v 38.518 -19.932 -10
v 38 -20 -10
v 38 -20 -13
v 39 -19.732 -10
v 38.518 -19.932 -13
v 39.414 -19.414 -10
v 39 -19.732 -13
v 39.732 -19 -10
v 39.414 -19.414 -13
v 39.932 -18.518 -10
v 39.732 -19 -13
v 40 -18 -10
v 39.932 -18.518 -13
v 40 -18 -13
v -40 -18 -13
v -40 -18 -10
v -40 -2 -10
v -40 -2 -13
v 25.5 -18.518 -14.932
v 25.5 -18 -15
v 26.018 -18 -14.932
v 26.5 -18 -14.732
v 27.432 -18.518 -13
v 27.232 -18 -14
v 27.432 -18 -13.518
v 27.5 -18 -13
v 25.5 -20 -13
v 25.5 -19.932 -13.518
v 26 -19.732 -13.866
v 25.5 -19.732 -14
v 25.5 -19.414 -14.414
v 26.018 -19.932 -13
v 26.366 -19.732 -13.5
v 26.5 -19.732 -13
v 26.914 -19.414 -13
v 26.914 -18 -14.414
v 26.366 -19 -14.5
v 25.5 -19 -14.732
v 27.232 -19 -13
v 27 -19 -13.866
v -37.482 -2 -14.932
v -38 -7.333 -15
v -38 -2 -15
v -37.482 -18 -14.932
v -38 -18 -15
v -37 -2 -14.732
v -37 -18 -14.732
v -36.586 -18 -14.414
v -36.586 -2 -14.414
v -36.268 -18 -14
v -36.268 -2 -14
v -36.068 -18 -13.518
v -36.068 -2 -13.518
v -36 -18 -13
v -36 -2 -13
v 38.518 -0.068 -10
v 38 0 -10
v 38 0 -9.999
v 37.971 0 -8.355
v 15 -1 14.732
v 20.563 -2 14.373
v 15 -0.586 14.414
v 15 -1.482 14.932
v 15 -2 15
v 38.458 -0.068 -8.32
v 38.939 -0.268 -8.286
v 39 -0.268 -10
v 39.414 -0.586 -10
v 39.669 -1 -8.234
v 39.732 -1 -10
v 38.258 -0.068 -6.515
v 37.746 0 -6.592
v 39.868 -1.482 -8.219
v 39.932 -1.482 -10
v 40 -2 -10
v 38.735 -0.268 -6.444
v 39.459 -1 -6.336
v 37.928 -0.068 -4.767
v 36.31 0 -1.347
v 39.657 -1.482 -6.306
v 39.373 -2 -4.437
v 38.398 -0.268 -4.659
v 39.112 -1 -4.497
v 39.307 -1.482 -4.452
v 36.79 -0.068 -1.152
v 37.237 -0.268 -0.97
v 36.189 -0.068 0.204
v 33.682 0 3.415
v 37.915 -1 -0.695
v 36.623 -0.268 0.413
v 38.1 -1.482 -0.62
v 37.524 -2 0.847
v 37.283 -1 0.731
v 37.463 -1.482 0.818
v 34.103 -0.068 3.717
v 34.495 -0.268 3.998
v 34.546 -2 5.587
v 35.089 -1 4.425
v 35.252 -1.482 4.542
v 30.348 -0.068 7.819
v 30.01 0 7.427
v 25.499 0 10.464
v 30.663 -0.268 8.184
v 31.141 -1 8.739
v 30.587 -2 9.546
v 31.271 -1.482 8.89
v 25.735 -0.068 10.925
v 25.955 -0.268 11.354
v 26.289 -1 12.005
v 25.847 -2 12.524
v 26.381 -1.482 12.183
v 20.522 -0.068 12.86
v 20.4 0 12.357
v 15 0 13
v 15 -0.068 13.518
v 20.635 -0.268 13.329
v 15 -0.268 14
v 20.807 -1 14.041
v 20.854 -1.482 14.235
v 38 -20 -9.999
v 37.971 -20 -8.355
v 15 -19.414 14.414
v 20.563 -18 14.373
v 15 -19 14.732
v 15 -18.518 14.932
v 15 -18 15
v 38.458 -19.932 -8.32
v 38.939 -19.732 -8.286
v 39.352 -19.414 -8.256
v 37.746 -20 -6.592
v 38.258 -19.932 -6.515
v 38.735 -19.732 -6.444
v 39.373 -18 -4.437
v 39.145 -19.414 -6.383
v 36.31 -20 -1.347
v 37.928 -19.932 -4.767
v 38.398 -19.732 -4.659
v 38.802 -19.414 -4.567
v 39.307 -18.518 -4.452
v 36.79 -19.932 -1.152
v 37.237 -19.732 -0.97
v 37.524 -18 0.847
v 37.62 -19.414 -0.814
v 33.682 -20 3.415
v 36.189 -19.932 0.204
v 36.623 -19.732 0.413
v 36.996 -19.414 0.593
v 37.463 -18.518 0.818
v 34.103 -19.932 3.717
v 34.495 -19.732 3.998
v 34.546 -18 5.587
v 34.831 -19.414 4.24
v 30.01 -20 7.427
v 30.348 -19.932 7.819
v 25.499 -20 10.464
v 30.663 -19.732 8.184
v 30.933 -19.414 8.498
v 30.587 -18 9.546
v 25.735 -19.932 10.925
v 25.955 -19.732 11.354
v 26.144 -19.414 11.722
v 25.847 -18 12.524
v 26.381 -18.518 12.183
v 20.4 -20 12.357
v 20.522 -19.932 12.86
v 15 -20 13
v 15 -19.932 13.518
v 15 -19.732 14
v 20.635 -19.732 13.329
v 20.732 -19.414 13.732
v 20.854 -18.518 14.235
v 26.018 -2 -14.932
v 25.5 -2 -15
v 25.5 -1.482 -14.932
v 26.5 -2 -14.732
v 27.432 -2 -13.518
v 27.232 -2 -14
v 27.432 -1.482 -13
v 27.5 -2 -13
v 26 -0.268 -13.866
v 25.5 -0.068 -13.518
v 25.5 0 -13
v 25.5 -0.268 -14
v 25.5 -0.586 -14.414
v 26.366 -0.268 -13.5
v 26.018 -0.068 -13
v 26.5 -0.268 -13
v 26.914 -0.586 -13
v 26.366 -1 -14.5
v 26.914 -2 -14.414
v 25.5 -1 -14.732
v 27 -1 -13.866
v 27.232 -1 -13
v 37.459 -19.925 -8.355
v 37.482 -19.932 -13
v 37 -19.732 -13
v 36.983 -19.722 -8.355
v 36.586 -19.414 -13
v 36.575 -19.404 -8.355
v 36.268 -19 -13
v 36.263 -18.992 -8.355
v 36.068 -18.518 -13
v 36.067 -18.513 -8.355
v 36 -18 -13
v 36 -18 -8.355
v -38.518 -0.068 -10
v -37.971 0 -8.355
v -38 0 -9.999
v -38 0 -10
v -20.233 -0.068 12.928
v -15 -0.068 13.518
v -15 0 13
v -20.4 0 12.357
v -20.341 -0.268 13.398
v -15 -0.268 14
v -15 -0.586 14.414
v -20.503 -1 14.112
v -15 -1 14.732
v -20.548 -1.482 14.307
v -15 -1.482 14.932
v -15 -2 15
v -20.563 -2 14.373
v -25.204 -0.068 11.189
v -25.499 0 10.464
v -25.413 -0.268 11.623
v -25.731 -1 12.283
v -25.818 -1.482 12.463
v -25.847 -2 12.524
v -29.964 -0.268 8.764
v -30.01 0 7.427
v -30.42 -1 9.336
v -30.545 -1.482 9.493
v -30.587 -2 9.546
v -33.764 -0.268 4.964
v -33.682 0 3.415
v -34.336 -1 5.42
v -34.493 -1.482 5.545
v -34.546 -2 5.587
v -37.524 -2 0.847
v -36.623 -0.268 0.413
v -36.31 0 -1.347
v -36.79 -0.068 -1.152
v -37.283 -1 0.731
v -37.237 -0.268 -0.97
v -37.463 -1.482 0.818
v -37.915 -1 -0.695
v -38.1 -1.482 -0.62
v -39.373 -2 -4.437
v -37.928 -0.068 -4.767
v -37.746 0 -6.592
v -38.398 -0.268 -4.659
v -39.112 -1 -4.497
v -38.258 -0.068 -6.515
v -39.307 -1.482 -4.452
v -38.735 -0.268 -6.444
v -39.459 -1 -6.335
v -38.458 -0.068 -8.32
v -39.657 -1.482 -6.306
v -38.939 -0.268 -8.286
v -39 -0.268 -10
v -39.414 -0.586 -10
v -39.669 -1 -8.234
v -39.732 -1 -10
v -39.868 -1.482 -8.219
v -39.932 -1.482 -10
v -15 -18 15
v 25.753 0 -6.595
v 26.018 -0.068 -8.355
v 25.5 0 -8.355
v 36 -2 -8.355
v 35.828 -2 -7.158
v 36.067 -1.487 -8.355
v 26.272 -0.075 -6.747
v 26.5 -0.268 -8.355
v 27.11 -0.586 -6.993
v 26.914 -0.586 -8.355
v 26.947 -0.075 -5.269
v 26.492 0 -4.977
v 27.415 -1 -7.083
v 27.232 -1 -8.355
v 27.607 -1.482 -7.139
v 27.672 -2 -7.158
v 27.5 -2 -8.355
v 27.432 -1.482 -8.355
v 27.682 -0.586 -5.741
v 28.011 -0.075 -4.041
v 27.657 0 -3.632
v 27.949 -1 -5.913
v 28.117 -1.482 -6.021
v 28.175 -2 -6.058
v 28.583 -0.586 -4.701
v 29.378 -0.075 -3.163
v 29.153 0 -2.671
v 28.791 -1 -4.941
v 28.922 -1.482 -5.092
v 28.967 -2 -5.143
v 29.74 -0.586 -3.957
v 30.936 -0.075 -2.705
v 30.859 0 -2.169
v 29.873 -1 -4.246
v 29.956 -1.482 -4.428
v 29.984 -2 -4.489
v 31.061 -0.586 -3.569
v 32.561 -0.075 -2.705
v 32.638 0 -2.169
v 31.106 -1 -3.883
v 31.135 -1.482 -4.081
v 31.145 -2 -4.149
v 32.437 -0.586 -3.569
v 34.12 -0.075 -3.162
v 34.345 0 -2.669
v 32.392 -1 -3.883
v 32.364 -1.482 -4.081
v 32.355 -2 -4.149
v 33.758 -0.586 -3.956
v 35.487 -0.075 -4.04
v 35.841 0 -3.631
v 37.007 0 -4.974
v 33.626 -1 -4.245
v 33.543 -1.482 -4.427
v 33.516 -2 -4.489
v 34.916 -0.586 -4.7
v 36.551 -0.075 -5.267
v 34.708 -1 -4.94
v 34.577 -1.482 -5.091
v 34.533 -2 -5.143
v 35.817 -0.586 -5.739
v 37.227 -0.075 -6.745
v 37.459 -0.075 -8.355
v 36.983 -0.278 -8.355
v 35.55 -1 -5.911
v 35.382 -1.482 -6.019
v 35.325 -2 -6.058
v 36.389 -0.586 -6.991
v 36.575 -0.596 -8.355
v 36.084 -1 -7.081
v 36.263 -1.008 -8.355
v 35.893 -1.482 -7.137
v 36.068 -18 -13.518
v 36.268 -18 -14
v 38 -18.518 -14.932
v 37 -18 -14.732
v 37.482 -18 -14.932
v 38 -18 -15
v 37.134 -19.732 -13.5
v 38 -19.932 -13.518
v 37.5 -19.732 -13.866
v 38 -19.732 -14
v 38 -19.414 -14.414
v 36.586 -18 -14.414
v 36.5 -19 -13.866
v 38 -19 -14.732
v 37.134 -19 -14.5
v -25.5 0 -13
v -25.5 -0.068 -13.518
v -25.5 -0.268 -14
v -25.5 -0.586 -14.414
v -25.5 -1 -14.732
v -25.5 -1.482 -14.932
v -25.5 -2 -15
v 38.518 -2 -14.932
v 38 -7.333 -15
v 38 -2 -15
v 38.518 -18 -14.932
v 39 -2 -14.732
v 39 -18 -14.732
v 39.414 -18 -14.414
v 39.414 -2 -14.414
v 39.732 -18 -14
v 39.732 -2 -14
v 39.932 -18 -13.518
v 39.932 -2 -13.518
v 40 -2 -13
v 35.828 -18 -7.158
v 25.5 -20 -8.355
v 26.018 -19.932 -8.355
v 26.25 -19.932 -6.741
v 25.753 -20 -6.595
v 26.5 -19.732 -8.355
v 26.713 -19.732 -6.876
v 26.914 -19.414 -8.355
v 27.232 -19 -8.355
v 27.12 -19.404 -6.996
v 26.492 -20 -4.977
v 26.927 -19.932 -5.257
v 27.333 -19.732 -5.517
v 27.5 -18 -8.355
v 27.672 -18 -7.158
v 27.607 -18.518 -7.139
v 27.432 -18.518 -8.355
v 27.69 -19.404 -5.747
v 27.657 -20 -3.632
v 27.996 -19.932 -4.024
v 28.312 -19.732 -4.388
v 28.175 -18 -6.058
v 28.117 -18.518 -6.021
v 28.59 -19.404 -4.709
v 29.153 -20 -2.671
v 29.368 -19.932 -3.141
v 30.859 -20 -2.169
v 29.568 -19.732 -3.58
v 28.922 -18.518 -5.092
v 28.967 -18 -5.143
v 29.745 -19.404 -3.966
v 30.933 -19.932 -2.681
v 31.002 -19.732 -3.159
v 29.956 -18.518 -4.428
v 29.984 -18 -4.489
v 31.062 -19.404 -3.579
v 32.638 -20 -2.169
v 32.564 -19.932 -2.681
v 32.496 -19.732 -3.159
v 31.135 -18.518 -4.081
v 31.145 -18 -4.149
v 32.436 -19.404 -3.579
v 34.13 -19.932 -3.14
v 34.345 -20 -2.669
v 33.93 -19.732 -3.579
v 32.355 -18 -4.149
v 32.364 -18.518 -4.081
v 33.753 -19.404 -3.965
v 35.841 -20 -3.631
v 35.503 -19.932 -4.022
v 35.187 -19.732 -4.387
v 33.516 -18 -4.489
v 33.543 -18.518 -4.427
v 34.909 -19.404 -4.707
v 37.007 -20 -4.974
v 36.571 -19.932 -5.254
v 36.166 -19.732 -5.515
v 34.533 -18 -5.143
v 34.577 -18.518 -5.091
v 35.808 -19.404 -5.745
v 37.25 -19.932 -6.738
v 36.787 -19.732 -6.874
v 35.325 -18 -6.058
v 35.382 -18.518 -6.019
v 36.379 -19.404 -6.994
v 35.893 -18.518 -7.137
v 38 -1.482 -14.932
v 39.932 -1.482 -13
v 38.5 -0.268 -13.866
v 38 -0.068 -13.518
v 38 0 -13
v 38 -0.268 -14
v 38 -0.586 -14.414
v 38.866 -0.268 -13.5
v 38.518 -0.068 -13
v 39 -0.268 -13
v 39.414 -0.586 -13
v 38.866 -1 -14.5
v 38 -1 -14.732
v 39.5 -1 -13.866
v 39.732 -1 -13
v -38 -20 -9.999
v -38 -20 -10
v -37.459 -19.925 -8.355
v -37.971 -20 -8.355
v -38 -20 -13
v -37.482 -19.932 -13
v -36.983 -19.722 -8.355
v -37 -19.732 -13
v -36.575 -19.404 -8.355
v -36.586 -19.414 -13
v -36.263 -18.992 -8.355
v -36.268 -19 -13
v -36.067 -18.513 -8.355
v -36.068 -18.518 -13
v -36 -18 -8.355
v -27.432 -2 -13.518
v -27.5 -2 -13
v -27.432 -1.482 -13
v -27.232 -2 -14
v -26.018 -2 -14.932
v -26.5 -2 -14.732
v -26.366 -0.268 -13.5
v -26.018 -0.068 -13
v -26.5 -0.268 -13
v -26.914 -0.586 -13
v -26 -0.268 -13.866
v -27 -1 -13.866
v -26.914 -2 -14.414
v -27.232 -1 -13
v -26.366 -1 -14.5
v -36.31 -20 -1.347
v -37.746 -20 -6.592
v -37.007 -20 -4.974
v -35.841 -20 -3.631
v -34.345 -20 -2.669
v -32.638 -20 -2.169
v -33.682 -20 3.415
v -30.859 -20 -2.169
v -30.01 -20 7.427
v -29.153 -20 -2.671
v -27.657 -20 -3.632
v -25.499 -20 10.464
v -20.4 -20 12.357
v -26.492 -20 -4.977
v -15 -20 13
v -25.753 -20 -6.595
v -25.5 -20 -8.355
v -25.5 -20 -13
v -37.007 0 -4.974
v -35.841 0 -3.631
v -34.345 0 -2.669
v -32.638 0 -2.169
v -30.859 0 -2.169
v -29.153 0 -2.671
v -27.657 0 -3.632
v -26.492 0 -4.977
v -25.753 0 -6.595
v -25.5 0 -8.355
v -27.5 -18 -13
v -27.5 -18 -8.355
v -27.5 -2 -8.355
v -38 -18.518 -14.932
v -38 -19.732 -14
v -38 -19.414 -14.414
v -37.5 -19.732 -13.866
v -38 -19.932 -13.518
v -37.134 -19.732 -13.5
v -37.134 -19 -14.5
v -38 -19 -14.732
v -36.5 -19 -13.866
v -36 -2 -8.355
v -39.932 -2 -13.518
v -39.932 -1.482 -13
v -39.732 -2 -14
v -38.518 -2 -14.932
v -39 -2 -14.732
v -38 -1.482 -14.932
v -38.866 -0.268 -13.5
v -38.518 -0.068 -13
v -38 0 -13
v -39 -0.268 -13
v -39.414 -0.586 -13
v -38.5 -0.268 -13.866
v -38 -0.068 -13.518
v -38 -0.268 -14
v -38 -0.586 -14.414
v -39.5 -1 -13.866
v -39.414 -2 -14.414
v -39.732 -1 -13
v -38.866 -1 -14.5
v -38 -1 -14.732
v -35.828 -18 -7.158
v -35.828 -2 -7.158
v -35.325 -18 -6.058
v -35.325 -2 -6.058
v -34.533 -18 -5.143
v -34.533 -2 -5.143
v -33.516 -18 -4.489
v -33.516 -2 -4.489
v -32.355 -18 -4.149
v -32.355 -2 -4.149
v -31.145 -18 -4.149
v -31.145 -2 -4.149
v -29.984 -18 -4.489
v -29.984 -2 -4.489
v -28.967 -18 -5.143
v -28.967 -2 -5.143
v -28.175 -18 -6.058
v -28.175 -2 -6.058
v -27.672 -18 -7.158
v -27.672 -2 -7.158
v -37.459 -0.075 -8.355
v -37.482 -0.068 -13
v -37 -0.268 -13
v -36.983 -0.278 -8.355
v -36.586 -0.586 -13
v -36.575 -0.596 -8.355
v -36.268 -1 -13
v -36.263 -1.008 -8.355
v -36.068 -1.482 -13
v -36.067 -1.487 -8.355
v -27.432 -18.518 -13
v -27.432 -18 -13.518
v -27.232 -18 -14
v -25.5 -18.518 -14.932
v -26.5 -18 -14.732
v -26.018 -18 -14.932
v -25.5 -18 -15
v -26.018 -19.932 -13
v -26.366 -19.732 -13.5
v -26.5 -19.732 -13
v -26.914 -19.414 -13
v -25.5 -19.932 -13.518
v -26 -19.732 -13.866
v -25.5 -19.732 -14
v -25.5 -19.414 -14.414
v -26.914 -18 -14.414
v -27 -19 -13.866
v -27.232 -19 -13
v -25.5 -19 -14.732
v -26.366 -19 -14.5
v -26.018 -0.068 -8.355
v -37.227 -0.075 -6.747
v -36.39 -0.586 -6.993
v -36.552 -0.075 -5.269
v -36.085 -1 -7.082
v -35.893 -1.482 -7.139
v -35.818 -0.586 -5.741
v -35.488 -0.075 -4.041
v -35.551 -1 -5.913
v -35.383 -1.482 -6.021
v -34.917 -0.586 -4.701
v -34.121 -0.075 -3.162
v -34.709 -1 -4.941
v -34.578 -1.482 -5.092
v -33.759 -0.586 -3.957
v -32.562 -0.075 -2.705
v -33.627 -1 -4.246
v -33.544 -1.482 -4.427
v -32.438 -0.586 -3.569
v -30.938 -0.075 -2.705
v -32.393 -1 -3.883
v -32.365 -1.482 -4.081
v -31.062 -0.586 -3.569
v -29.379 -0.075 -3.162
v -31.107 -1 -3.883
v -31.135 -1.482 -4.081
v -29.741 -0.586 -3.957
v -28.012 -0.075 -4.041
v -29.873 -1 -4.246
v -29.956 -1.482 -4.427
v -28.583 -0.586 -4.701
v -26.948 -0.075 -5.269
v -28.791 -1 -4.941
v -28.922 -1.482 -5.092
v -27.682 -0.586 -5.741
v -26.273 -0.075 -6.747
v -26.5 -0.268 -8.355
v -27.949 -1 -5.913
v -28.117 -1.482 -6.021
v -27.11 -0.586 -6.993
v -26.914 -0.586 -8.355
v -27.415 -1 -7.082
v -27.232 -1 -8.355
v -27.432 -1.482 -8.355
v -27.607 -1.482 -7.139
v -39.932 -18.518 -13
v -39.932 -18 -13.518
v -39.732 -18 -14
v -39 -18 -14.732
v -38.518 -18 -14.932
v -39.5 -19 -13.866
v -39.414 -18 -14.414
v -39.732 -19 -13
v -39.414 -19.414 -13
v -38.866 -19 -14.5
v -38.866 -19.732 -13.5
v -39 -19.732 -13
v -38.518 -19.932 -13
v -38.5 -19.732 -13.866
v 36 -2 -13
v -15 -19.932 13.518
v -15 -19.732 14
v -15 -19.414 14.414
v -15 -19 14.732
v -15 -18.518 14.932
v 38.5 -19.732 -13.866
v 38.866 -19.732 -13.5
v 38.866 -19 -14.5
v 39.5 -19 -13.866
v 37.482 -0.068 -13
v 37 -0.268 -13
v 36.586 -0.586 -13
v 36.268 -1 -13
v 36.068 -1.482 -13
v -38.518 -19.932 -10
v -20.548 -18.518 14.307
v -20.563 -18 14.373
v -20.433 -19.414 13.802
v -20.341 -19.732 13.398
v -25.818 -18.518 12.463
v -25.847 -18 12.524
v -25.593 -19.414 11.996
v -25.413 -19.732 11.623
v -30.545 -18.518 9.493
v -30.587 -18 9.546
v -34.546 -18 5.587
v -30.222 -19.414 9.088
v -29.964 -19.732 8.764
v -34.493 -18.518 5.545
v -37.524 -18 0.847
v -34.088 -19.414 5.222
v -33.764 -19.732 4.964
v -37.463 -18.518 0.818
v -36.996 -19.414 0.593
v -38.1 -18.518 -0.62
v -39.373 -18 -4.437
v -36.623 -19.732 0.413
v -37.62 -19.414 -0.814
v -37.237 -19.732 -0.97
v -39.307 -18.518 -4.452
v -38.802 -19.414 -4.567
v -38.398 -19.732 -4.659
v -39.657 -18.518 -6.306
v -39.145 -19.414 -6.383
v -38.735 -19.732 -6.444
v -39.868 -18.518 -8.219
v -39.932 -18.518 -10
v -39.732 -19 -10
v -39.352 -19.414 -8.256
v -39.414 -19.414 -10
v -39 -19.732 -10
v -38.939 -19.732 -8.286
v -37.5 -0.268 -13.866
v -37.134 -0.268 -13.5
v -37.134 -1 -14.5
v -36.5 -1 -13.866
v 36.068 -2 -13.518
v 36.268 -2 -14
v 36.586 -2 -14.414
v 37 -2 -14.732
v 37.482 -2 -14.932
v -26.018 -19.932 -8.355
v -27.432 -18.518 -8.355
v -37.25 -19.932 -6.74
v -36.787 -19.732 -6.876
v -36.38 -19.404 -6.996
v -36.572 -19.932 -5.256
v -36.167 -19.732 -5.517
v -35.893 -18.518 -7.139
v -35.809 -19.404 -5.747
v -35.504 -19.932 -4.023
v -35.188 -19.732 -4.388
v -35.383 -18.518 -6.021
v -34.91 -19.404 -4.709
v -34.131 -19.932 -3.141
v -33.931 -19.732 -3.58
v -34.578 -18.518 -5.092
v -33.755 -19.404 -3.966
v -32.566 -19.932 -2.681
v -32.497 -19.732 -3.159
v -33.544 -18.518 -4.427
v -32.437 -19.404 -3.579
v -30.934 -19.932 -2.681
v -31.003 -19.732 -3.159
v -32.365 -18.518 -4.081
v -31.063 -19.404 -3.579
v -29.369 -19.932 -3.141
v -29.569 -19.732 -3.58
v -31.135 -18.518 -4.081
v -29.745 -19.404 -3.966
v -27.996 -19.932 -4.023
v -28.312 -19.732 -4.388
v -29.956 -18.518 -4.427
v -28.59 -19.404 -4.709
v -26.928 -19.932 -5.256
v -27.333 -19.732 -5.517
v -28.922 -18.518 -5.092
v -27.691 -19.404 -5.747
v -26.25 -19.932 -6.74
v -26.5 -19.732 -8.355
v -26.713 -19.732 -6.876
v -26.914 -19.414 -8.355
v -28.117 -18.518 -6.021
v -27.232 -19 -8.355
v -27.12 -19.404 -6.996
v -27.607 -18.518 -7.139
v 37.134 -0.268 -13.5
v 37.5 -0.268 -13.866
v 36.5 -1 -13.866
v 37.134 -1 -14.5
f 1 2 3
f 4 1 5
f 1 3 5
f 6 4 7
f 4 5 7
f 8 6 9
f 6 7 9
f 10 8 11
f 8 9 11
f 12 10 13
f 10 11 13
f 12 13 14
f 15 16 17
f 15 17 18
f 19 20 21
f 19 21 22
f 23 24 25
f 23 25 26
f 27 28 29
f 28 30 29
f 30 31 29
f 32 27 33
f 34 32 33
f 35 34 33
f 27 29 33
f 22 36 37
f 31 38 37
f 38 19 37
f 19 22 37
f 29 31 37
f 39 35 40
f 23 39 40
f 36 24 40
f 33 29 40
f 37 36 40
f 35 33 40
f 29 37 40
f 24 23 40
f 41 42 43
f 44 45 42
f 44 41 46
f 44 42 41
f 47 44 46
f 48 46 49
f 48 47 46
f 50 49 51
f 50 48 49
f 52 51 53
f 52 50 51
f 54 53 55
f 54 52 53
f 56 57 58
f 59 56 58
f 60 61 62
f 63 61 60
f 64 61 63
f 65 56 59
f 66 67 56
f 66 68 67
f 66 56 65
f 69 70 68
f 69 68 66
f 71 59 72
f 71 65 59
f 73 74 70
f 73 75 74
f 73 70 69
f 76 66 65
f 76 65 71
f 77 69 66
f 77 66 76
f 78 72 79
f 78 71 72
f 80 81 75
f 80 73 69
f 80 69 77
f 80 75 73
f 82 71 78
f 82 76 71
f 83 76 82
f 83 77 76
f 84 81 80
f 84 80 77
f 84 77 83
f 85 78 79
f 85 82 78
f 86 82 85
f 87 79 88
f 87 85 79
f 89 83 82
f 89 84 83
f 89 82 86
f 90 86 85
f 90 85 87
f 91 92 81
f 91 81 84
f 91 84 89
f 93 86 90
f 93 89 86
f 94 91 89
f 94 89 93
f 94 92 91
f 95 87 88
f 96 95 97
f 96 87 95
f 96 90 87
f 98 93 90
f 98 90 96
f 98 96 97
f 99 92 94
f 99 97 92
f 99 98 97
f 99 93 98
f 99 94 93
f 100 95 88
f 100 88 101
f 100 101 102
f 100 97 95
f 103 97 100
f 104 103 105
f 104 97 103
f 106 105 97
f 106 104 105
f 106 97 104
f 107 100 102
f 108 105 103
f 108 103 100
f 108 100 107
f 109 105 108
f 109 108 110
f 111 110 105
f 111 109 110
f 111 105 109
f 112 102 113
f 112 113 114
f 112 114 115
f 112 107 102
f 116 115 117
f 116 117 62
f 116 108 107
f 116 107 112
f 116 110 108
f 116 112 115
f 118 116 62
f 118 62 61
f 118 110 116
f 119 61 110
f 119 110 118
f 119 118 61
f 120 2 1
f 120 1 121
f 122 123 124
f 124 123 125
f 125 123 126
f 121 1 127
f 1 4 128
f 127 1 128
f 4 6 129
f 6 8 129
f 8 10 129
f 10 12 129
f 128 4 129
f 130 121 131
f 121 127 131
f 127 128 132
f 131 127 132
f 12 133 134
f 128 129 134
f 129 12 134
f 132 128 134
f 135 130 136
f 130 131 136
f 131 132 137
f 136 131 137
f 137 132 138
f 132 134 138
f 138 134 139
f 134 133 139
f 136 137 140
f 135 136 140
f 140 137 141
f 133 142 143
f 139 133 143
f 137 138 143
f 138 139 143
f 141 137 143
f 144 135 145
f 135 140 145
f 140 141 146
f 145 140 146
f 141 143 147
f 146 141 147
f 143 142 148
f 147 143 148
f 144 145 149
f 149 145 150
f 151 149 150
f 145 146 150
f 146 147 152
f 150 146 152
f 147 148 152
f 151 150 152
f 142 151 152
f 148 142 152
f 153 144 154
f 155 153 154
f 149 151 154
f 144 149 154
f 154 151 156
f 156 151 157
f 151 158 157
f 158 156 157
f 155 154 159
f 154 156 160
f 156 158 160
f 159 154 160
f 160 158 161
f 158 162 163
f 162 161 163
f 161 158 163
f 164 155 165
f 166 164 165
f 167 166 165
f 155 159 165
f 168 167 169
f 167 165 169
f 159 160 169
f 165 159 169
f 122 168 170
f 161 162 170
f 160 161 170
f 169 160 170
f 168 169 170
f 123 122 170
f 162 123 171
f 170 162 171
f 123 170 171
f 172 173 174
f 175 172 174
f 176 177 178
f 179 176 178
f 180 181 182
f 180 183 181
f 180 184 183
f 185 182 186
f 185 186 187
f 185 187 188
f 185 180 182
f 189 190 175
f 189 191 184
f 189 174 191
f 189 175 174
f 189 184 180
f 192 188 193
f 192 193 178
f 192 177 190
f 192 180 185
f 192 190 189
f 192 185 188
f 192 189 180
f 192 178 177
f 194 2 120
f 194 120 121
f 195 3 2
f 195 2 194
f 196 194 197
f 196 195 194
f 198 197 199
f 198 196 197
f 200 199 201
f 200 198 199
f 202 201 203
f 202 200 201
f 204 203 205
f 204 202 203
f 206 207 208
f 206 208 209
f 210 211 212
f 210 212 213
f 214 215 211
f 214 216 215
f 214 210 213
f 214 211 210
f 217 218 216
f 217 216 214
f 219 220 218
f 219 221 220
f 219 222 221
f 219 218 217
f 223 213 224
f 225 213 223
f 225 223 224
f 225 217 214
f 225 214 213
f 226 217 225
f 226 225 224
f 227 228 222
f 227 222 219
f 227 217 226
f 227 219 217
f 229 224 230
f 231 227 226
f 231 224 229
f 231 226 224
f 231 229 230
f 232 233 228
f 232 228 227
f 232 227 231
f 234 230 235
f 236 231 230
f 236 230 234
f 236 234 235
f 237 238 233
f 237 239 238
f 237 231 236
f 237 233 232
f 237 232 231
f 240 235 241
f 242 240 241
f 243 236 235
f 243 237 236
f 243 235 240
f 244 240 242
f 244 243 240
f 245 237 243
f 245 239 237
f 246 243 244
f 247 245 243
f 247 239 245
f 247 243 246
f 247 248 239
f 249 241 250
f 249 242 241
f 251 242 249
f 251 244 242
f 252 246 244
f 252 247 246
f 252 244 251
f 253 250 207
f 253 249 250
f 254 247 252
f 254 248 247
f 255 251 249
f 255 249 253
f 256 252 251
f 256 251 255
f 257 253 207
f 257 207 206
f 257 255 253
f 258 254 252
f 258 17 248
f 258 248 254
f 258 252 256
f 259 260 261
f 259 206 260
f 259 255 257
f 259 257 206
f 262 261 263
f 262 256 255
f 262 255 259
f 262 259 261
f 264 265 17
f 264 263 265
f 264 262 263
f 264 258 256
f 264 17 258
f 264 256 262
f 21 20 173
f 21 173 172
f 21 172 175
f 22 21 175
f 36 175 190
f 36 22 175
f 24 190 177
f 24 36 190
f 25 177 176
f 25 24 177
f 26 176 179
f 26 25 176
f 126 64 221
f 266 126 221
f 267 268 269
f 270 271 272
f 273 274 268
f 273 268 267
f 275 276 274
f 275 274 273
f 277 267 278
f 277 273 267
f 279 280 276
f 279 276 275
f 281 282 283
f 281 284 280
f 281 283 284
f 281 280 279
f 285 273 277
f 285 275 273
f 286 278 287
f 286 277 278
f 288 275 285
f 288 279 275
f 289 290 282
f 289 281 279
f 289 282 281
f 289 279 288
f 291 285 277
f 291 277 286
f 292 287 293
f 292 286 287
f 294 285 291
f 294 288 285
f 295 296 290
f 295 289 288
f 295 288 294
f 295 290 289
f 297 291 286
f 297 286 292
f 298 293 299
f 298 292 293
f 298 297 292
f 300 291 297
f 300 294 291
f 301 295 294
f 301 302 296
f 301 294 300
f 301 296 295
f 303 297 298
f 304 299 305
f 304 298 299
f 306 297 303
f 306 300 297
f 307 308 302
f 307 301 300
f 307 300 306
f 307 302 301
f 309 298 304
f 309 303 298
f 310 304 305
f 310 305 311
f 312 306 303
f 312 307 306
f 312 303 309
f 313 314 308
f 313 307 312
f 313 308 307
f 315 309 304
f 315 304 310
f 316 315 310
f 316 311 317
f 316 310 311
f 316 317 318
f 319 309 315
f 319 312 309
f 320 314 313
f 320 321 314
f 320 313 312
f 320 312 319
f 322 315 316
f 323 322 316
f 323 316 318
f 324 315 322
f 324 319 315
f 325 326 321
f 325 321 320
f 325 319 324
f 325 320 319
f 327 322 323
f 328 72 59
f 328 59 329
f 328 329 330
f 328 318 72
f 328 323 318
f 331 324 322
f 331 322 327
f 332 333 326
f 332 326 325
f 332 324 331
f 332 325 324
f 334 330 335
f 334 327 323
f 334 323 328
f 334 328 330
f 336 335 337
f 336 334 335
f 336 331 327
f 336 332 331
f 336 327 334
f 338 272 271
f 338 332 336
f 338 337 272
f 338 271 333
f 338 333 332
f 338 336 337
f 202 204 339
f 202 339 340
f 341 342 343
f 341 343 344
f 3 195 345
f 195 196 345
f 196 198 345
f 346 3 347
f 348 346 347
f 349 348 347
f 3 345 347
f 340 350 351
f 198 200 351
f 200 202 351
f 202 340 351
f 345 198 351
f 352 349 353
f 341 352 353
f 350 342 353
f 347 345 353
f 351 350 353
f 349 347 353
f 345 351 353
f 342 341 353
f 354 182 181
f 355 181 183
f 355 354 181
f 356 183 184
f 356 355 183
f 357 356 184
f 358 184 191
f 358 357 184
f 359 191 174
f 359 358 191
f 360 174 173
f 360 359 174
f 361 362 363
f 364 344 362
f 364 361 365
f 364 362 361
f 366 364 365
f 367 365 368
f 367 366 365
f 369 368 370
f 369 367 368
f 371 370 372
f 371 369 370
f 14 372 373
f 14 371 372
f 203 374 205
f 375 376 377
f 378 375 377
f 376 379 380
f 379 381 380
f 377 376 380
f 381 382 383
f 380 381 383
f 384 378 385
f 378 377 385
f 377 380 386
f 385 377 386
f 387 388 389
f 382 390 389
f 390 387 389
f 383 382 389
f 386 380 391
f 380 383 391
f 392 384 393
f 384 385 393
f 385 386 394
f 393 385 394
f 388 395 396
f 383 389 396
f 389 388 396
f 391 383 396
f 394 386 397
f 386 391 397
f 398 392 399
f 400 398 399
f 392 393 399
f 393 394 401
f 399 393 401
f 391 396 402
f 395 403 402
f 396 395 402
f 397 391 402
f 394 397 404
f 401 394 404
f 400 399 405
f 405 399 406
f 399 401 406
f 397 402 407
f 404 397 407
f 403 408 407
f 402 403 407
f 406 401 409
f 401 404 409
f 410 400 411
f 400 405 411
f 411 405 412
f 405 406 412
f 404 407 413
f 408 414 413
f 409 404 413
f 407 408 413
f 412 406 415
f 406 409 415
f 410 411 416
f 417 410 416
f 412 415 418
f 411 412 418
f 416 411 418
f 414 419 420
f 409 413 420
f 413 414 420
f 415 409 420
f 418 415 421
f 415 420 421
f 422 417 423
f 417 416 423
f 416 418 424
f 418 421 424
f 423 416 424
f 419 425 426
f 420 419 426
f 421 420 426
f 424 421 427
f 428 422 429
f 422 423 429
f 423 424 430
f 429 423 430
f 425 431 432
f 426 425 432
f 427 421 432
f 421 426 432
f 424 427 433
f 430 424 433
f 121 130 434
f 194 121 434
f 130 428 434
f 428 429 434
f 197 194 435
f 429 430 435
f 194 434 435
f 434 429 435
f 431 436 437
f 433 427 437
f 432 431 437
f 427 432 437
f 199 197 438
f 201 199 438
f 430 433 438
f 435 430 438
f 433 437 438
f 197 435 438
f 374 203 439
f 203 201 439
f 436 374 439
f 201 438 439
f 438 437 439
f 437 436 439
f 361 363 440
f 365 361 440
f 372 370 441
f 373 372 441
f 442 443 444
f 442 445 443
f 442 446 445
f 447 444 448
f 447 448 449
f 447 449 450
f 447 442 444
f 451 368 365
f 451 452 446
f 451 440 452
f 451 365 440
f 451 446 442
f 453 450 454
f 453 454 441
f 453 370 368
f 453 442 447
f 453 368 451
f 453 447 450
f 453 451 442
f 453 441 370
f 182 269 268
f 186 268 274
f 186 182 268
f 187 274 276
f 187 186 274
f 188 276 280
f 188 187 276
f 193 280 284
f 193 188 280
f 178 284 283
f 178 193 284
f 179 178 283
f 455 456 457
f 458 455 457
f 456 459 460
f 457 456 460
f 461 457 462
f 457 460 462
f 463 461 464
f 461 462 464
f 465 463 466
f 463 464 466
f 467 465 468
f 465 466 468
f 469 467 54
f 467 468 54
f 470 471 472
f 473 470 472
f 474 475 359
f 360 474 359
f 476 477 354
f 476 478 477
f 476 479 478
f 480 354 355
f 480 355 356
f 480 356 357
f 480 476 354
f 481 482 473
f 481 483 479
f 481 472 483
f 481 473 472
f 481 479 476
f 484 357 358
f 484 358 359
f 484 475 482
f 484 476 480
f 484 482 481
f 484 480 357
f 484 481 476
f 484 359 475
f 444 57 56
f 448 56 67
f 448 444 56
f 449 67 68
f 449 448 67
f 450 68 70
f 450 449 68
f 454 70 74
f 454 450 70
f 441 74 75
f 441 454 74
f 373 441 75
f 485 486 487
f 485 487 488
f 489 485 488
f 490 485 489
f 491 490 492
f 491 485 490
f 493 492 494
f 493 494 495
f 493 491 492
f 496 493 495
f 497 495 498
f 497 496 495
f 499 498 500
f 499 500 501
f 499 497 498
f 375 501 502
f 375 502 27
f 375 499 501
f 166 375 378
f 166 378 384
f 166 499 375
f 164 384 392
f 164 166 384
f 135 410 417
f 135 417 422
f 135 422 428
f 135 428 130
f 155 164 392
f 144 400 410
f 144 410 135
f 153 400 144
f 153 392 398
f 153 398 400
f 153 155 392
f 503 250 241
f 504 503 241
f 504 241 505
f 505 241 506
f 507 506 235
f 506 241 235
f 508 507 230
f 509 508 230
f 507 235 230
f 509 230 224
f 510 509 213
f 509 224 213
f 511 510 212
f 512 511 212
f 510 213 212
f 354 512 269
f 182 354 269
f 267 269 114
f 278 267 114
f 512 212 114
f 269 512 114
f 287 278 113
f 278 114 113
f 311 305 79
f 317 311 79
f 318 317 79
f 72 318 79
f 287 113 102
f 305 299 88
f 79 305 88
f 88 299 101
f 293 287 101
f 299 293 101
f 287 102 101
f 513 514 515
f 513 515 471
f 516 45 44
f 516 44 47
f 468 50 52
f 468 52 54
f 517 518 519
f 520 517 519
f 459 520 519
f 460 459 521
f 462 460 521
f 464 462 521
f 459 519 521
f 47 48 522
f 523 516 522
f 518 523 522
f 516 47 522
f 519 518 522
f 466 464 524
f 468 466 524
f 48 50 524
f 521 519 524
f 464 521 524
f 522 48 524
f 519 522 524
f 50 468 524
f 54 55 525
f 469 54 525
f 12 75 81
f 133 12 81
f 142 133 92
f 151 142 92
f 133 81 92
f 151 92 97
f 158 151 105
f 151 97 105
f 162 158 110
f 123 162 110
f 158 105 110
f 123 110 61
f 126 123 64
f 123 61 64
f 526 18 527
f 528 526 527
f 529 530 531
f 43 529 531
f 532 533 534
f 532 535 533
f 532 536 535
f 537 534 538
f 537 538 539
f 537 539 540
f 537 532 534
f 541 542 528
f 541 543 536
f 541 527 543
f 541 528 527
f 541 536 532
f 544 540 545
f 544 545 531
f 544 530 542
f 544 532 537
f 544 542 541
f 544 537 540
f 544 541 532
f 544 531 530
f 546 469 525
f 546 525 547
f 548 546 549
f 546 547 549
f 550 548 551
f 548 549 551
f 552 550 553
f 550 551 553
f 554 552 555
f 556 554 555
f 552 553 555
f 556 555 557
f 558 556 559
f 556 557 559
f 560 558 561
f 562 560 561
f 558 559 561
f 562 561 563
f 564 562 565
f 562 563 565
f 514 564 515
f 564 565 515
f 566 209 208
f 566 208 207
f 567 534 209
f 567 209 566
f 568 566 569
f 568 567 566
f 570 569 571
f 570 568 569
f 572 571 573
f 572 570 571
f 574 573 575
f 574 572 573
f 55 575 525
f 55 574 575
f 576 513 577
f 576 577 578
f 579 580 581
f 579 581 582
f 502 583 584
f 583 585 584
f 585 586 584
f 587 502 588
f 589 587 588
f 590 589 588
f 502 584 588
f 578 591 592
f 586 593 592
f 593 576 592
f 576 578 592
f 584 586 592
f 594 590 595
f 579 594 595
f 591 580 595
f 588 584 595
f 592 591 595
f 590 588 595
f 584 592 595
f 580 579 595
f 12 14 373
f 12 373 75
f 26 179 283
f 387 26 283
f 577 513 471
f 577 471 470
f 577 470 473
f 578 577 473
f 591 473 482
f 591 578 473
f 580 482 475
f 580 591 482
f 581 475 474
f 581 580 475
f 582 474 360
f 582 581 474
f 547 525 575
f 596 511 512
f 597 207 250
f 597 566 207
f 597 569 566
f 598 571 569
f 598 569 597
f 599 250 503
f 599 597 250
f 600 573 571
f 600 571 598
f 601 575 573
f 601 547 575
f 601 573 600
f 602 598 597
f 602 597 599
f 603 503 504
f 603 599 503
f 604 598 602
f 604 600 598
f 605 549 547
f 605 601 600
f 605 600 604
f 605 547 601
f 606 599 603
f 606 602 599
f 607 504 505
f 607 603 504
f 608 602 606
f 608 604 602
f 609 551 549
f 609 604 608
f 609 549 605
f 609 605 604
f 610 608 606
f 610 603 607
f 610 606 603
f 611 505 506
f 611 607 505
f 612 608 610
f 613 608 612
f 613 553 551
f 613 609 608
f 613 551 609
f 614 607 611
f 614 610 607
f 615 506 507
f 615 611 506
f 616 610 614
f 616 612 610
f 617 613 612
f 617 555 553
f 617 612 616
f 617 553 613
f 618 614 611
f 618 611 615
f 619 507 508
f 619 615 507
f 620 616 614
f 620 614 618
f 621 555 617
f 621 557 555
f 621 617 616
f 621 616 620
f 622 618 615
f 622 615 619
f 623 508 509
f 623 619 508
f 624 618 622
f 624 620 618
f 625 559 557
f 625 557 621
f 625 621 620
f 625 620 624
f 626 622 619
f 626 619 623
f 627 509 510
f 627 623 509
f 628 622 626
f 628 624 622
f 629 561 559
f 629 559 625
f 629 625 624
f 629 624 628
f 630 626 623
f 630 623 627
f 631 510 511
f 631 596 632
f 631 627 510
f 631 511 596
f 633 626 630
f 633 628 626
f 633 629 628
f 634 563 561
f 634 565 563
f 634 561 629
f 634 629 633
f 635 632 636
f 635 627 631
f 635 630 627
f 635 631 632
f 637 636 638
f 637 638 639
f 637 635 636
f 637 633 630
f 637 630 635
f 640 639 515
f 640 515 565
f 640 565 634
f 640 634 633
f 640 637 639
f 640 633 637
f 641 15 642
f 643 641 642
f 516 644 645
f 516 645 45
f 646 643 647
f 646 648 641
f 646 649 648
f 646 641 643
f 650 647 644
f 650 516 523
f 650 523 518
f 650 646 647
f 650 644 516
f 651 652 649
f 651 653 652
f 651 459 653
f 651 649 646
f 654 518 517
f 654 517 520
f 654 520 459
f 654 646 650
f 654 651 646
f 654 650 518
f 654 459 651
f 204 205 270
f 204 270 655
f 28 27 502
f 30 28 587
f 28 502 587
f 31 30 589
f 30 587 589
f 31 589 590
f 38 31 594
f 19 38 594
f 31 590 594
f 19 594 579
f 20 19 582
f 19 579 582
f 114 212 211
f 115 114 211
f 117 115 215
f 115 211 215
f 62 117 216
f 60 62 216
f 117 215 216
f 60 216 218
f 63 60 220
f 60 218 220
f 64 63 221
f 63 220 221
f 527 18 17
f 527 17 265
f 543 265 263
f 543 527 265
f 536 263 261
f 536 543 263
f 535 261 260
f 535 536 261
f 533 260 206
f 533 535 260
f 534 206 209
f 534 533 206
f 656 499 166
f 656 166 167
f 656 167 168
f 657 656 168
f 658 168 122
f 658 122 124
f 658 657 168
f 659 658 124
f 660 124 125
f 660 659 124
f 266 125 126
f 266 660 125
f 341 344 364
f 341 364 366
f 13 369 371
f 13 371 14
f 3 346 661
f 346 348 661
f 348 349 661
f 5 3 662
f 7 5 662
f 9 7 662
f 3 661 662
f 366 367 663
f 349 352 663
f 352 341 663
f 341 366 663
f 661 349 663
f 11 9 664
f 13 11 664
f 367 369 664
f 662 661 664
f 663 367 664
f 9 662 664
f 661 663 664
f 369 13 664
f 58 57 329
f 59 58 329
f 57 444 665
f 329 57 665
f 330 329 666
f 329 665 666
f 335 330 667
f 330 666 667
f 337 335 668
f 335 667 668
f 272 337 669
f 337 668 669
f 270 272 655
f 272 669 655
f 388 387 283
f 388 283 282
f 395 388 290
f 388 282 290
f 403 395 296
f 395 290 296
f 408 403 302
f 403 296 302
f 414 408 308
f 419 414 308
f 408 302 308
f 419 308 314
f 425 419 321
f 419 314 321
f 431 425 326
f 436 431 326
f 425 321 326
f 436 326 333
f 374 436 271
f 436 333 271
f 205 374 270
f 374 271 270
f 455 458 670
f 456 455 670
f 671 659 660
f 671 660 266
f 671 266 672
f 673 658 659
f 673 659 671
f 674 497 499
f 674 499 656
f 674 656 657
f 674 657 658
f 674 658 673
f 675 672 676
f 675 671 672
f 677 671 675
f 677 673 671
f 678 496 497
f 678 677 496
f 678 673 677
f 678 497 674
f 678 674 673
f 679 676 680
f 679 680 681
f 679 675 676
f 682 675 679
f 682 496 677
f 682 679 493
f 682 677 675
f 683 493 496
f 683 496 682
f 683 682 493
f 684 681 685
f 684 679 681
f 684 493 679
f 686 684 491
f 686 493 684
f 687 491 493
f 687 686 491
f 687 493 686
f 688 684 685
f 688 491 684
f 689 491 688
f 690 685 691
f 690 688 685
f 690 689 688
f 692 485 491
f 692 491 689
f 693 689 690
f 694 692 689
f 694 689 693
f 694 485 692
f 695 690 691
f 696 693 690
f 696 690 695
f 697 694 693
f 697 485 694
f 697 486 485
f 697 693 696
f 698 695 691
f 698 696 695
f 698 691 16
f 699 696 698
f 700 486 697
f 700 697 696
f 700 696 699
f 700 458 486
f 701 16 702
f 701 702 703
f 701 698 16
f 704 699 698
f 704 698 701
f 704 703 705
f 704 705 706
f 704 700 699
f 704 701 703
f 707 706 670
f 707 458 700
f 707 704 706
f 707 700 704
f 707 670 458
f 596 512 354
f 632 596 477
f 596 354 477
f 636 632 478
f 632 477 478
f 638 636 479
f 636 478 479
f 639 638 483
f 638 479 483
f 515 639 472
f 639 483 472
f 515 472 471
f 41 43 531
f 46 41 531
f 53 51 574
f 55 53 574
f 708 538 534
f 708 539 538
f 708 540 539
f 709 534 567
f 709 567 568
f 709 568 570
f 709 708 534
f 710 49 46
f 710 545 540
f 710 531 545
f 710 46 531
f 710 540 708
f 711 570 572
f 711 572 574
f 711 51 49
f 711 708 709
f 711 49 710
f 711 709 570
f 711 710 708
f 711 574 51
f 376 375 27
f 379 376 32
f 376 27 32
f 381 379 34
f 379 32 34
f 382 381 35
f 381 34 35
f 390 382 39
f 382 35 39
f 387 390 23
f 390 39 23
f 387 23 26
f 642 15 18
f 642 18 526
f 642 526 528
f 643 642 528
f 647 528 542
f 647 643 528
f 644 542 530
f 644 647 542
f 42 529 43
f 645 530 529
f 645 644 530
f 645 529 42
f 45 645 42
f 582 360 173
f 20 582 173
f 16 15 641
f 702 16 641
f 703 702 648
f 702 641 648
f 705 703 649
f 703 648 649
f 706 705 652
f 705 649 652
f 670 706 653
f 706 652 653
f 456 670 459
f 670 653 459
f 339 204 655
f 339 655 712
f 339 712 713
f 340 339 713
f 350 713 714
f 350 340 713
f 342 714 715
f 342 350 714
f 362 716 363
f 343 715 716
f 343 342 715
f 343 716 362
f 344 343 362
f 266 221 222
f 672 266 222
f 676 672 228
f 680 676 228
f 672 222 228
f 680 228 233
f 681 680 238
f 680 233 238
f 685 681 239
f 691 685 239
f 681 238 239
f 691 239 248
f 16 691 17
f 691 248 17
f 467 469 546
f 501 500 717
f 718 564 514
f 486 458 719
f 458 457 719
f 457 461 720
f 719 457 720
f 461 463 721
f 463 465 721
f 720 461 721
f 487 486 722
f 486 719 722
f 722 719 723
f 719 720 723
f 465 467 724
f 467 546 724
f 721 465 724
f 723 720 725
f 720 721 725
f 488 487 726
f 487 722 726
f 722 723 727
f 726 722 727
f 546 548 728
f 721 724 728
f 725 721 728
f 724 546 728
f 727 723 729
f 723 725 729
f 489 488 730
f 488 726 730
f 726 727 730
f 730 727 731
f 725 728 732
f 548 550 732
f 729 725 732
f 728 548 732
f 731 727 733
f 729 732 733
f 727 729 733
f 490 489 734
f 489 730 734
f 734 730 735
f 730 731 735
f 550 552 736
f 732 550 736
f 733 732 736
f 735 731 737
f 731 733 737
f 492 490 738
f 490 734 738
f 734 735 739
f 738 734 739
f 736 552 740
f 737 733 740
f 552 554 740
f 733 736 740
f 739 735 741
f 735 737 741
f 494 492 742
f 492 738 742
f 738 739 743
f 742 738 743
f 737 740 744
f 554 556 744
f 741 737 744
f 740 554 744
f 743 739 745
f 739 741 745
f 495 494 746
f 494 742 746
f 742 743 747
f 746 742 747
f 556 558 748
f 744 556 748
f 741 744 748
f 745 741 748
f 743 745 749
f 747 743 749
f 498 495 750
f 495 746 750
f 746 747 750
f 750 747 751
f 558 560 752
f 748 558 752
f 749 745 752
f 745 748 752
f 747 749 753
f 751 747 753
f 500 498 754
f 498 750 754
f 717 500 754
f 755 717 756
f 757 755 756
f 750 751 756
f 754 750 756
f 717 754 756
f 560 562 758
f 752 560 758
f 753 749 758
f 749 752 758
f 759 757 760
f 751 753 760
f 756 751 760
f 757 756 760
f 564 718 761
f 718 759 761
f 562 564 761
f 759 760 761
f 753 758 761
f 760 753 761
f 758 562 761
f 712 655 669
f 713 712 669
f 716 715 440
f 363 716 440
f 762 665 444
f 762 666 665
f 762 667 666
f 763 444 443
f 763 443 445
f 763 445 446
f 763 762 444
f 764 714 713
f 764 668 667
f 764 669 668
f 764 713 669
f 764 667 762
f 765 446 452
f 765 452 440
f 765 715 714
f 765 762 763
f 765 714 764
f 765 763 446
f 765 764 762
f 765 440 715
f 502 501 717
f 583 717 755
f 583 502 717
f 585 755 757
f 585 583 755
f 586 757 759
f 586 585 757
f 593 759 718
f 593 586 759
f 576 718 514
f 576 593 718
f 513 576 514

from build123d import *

# Parameters (mm, degrees)
F1_DEPTH     = 20
F2_R         = 1.99999
F3_T1_DEPTH  = 30
F3_T3_DEPTH  = 8.00001
F3_T5_DEPTH  = 10.00002
F3_T7_DEPTH  = 9.6446849121
F3_T9_DEPTH  = 61.00002
F3_T11_DEPTH = 10.00002
F3_T14_ANGLE = 90
F3_T16_ANGLE = 90
F3_T18_ANGLE = 90
F3_T20_ANGLE = 90
F3_T22_ANGLE = 180
F3_T24_ANGLE = 90
F3_T26_ANGLE = 90
F3_T28_ANGLE = 180
F3_T30_ANGLE = 90
F3_T32_ANGLE = 90
F3_T34_ANGLE = 90
F3_T36_ANGLE = 90
F3_T38_ANGLE = 90
F3_T40_ANGLE = 90
F3_T42_ANGLE = 180
F3_T44_ANGLE = 90
F3_T46_ANGLE = 90
F3_T48_ANGLE = 180
F3_T50_ANGLE = 90
F3_T52_ANGLE = 90


# Not quite as in the source:
# - a fillet or chamfer that OpenCascade refuses, or shapes differently, is made with other operations: its cross-section is extruded or revolved along the edge and cut away or added
# - a fillet or chamfer is up to 0.001 mm smaller than in the source, because OpenCascade refuses the exact size


with BuildPart() as f1:
    # F0 (on Front) → F1 (new body)
    with BuildSketch(Plane.XZ):
        with BuildLine():
            Line((15, 15), (-15, 15))
            ThreePointArc((-15, 15), (-32.6776695297, 7.6776695297), (-40, -10))
            Line((-40, -10), (-40, -15))
            Line((-40, -15), (-36, -15))
            Line((-36, -15), (-36, -8.3553250879))
            ThreePointArc((-36, -8.3553250879), (-31.75, -4.1053250879), (-27.5, -8.3553250879))
            Line((-27.5, -8.3553250879), (-27.5, -15))
            Line((-27.5, -15), (27.5, -15))
            Line((27.5, -15), (27.5, -8.3553250879))
            ThreePointArc((27.5, -8.3553250879), (31.75, -4.1053250879), (36, -8.3553250879))
            Line((36, -8.3553250879), (36, -15))
            Line((36, -15), (40, -15))
            Line((40, -15), (40, -10))
            ThreePointArc((40, -10), (32.6776695297, 7.6776695297), (15, 15))
        make_face()
    extrude(amount=F1_DEPTH)

    # F2 (radius 2 in the source; OpenCascade refuses exactly that, so slightly less here)
    f2_edges = [f1.edges().sort_by_distance(p)[0] for p in [
        (36, -10, -15),
        (27.5, -10, -15),
        (40, -10, -15),
        (-27.5, -10, -15),
        (-36, -10, -15),
        (-40, -10, -15),
    ]]
    fillet(f2_edges, radius=F2_R)

    # F3: fillet of radius 2 on 2 edges, made by hand

    # F3_s2 → F3_t1 (cut)
    with BuildSketch(Plane.YZ.offset(-15)):
        with BuildLine():
            ThreePointArc((0, 13), (-0.5857864376, 14.4142135624), (-2, 15))
            Line((-2, 15), (0, 15))
            Line((0, 15), (0, 13))
        make_face()
        with BuildLine():
            ThreePointArc((-20, 13), (-19.4142135624, 14.4142135624), (-18, 15))
            Line((-18, 15), (-20, 15))
            Line((-20, 15), (-20, 13))
        make_face()
    extrude(amount=F3_T1_DEPTH, mode=Mode.SUBTRACT)

    # F3_s4 → F3_t3 (cut)
    with BuildSketch(Plane.XY.offset(-18.00001)):
        with BuildLine():
            ThreePointArc((38, -20), (39.4142135624, -19.4142135624), (40, -18))
            Line((40, -18), (40, -20))
            Line((40, -20), (38, -20))
        make_face()
        with BuildLine():
            ThreePointArc((-40, -18), (-39.4142135624, -19.4142135624), (-38, -20))
            Line((-38, -20), (-40, -20))
            Line((-40, -20), (-40, -18))
        make_face()
        with BuildLine():
            ThreePointArc((-40, -2), (-39.4142135624, -0.5857864376), (-38, 0))
            Line((-38, 0), (-40, 0))
            Line((-40, 0), (-40, -2))
        make_face()
        with BuildLine():
            ThreePointArc((38, 0), (39.4142135624, -0.5857864376), (40, -2))
            Line((40, -2), (40, 0))
            Line((40, 0), (38, 0))
        make_face()
    extrude(amount=F3_T3_DEPTH, mode=Mode.SUBTRACT)

    # F3_s6 → F3_t5 (cut)
    with BuildSketch(Plane.YZ.offset(-43.00001)):
        with BuildLine():
            ThreePointArc((-20, -13), (-19.4142135624, -14.4142135624), (-18, -15))
            Line((-18, -15), (-20, -15))
            Line((-20, -15), (-20, -13))
        make_face()
        with BuildLine():
            ThreePointArc((0, -13), (-0.5857864376, -14.4142135624), (-2, -15))
            Line((-2, -15), (0, -15))
            Line((0, -15), (0, -13))
        make_face()
    extrude(amount=F3_T5_DEPTH, mode=Mode.SUBTRACT)

    # F3_s8 → F3_t7 (cut)
    with BuildSketch(Plane.XY.offset(-18.00001)):
        with BuildLine():
            ThreePointArc((-38, -20), (-36.5857864376, -19.4142135624), (-36, -18))
            Line((-36, -18), (-36, -20))
            Line((-36, -20), (-38, -20))
        make_face()
        with BuildLine():
            ThreePointArc((-25.5, -20), (-26.9142135624, -19.4142135624), (-27.5, -18))
            Line((-27.5, -18), (-27.5, -20))
            Line((-27.5, -20), (-25.5, -20))
        make_face()
        with BuildLine():
            ThreePointArc((25.5, -20), (26.9142135624, -19.4142135624), (27.5, -18))
            Line((27.5, -18), (27.5, -20))
            Line((27.5, -20), (25.5, -20))
        make_face()
        with BuildLine():
            ThreePointArc((38, -20), (36.5857864376, -19.4142135624), (36, -18))
            Line((36, -18), (36, -20))
            Line((36, -20), (38, -20))
        make_face()
        with BuildLine():
            ThreePointArc((-38, 0), (-36.5857864376, -0.5857864376), (-36, -2))
            Line((-36, -2), (-36, 0))
            Line((-36, 0), (-38, 0))
        make_face()
        with BuildLine():
            ThreePointArc((-25.5, 0), (-26.9142135624, -0.5857864376), (-27.5, -2))
            Line((-27.5, -2), (-27.5, 0))
            Line((-27.5, 0), (-25.5, 0))
        make_face()
        with BuildLine():
            ThreePointArc((25.5, 0), (26.9142135624, -0.5857864376), (27.5, -2))
            Line((27.5, -2), (27.5, 0))
            Line((27.5, 0), (25.5, 0))
        make_face()
        with BuildLine():
            ThreePointArc((38, 0), (36.5857864376, -0.5857864376), (36, -2))
            Line((36, -2), (36, 0))
            Line((36, 0), (38, 0))
        make_face()
    extrude(amount=F3_T7_DEPTH, mode=Mode.SUBTRACT)

    # F3_s10 → F3_t9 (cut)
    with BuildSketch(Plane.YZ.offset(-30.50001)):
        with BuildLine():
            ThreePointArc((-20, -13), (-19.4142135624, -14.4142135624), (-18, -15))
            Line((-18, -15), (-20, -15))
            Line((-20, -15), (-20, -13))
        make_face()
        with BuildLine():
            ThreePointArc((0, -13), (-0.5857864376, -14.4142135624), (-2, -15))
            Line((-2, -15), (0, -15))
            Line((0, -15), (0, -13))
        make_face()
    extrude(amount=F3_T9_DEPTH, mode=Mode.SUBTRACT)

    # F3_s12 → F3_t11 (cut)
    with BuildSketch(Plane.YZ.offset(32.99999)):
        with BuildLine():
            ThreePointArc((-20, -13), (-19.4142135624, -14.4142135624), (-18, -15))
            Line((-18, -15), (-20, -15))
            Line((-20, -15), (-20, -13))
        make_face()
        with BuildLine():
            ThreePointArc((0, -13), (-0.5857864376, -14.4142135624), (-2, -15))
            Line((-2, -15), (0, -15))
            Line((0, -15), (0, -13))
        make_face()
    extrude(amount=F3_T11_DEPTH, mode=Mode.SUBTRACT)

    # F3_s13 → F3_t14 (revolve, cut)
    with BuildSketch(Plane.XY.offset(-10)):
        with BuildLine():
            ThreePointArc((38, -20), (39.4142135624, -19.4142135624), (40, -18))
            Line((40, -18), (40, -20))
            Line((40, -20), (38, -20))
        make_face()
    revolve(axis=Axis((15, -20, -10), (0, -1, 0)), revolution_arc=F3_T14_ANGLE, mode=Mode.SUBTRACT)

    # F3_s15 → F3_t16 (revolve, cut)
    with BuildSketch(Plane.YZ.offset(-15)):
        with BuildLine():
            ThreePointArc((-18, 15), (-19.4142135624, 14.4142135624), (-20, 13))
            Line((-20, 13), (-20, 15))
            Line((-20, 15), (-18, 15))
        make_face()
    revolve(axis=Axis((-15, -20, -10), (0, -1, 0)), revolution_arc=F3_T16_ANGLE, mode=Mode.SUBTRACT)

    # F3_s17 → F3_t18 (revolve, cut)
    with BuildSketch(Plane.XY.offset(-13.00001)):
        with BuildLine():
            ThreePointArc((-40, -18), (-39.4142170979, -19.4142100268), (-38.00001, -20))
            Line((-38.00001, -20), (-40, -20))
            Line((-40, -20), (-40, -18))
        make_face()
    revolve(axis=Axis((-38.00001, -20, -13.00001), (0, -1, 0)), revolution_arc=F3_T18_ANGLE, mode=Mode.SUBTRACT)

    # F3_s19 → F3_t20 (revolve, cut)
    with BuildSketch(Plane.YZ.offset(-37.99999)):
        with BuildLine():
            ThreePointArc((-20, -13.00001), (-19.4142100268, -14.4142170979), (-18, -15))
            Line((-18, -15), (-20, -15))
            Line((-20, -15), (-20, -13.00001))
        make_face()
    revolve(axis=Axis((-37.99999, -20, -13.00001), (0, -1, 0)), revolution_arc=F3_T20_ANGLE, mode=Mode.SUBTRACT)

    # F3_s21 → F3_t22 (revolve, cut)
    with BuildSketch(Plane.XY.offset(-8.3553250879)):
        with BuildLine():
            ThreePointArc((-38, -20), (-36.5857864376, -19.4142135624), (-36, -18))
            Line((-36, -18), (-36, -20))
            Line((-36, -20), (-38, -20))
        make_face()
    revolve(axis=Axis((-31.75, -20, -8.3553250879), (0, 1, 0)), revolution_arc=F3_T22_ANGLE, mode=Mode.SUBTRACT)

    # F3_s23 → F3_t24 (revolve, cut)
    with BuildSketch(Plane.XY.offset(-13.00001)):
        with BuildLine():
            ThreePointArc((-25.50001, -20), (-26.9142170979, -19.4142100268), (-27.5, -18))
            Line((-27.5, -18), (-27.5, -20))
            Line((-27.5, -20), (-25.50001, -20))
        make_face()
    revolve(axis=Axis((-25.50001, -20, -13.00001), (0, -1, 0)), revolution_arc=F3_T24_ANGLE, mode=Mode.SUBTRACT)

    # F3_s25 → F3_t26 (revolve, cut)
    with BuildSketch(Plane.YZ.offset(25.50001)):
        with BuildLine():
            ThreePointArc((-20, -13.00001), (-19.4142100268, -14.4142170979), (-18, -15))
            Line((-18, -15), (-20, -15))
            Line((-20, -15), (-20, -13.00001))
        make_face()
    revolve(axis=Axis((25.50001, -20, -13.00001), (0, -1, 0)), revolution_arc=F3_T26_ANGLE, mode=Mode.SUBTRACT)

    # F3_s27 → F3_t28 (revolve, cut)
    with BuildSketch(Plane.XY.offset(-8.3553250879)):
        with BuildLine():
            ThreePointArc((25.5, -20), (26.9142135624, -19.4142135624), (27.5, -18))
            Line((27.5, -18), (27.5, -20))
            Line((27.5, -20), (25.5, -20))
        make_face()
    revolve(axis=Axis((31.75, -20, -8.3553250879), (0, 1, 0)), revolution_arc=F3_T28_ANGLE, mode=Mode.SUBTRACT)

    # F3_s29 → F3_t30 (revolve, cut)
    with BuildSketch(Plane.XY.offset(-13.00001)):
        with BuildLine():
            ThreePointArc((37.99999, -20), (36.5857829021, -19.4142100268), (36, -18))
            Line((36, -18), (36, -20))
            Line((36, -20), (37.99999, -20))
        make_face()
    revolve(axis=Axis((37.99999, -20, -13.00001), (0, -1, 0)), revolution_arc=F3_T30_ANGLE, mode=Mode.SUBTRACT)

    # F3_s31 → F3_t32 (revolve, cut)
    with BuildSketch(Plane.YZ.offset(38.00001)):
        with BuildLine():
            ThreePointArc((-20, -13.00001), (-19.4142100268, -14.4142170979), (-18, -15))
            Line((-18, -15), (-20, -15))
            Line((-20, -15), (-20, -13.00001))
        make_face()
    revolve(axis=Axis((38.00001, -20, -13.00001), (0, -1, 0)), revolution_arc=F3_T32_ANGLE, mode=Mode.SUBTRACT)

    # F3_s33 → F3_t34 (revolve, cut)
    with BuildSketch(Plane.XY.offset(-10)):
        with BuildLine():
            ThreePointArc((38, 0), (39.4142135624, -0.5857864376), (40, -2))
            Line((40, -2), (40, 0))
            Line((40, 0), (38, 0))
        make_face()
    revolve(axis=Axis((15, 0, -10), (0, -1, 0)), revolution_arc=F3_T34_ANGLE, mode=Mode.SUBTRACT)

    # F3_s35 → F3_t36 (revolve, cut)
    with BuildSketch(Plane.YZ.offset(-15)):
        with BuildLine():
            ThreePointArc((0, 13), (-0.5857864376, 14.4142135624), (-2, 15))
            Line((-2, 15), (0, 15))
            Line((0, 15), (0, 13))
        make_face()
    revolve(axis=Axis((-15, 0, -10), (0, -1, 0)), revolution_arc=F3_T36_ANGLE, mode=Mode.SUBTRACT)

    # F3_s37 → F3_t38 (revolve, cut)
    with BuildSketch(Plane.XY.offset(-13.00001)):
        with BuildLine():
            ThreePointArc((-38.00001, 0), (-39.4142170979, -0.5857899732), (-40, -2))
            Line((-40, -2), (-40, 0))
            Line((-40, 0), (-38.00001, 0))
        make_face()
    revolve(axis=Axis((-38.00001, 0, -13.00001), (0, -1, 0)), revolution_arc=F3_T38_ANGLE, mode=Mode.SUBTRACT)

    # F3_s39 → F3_t40 (revolve, cut)
    with BuildSketch(Plane.YZ.offset(-37.99999)):
        with BuildLine():
            ThreePointArc((0, -13.00001), (-0.5857899732, -14.4142170979), (-2, -15))
            Line((-2, -15), (0, -15))
            Line((0, -15), (0, -13.00001))
        make_face()
    revolve(axis=Axis((-37.99999, 0, -13.00001), (0, -1, 0)), revolution_arc=F3_T40_ANGLE, mode=Mode.SUBTRACT)

    # F3_s41 → F3_t42 (revolve, cut)
    with BuildSketch(Plane.XY.offset(-8.3553250879)):
        with BuildLine():
            ThreePointArc((-38, 0), (-36.5857864376, -0.5857864376), (-36, -2))
            Line((-36, -2), (-36, 0))
            Line((-36, 0), (-38, 0))
        make_face()
    revolve(axis=Axis((-31.75, 0, -8.3553250879), (0, 1, 0)), revolution_arc=F3_T42_ANGLE, mode=Mode.SUBTRACT)

    # F3_s43 → F3_t44 (revolve, cut)
    with BuildSketch(Plane.XY.offset(-13.00001)):
        with BuildLine():
            ThreePointArc((-25.50001, 0), (-26.9142170979, -0.5857899732), (-27.5, -2))
            Line((-27.5, -2), (-27.5, 0))
            Line((-27.5, 0), (-25.50001, 0))
        make_face()
    revolve(axis=Axis((-25.50001, 0, -13.00001), (0, -1, 0)), revolution_arc=F3_T44_ANGLE, mode=Mode.SUBTRACT)

    # F3_s45 → F3_t46 (revolve, cut)
    with BuildSketch(Plane.YZ.offset(25.50001)):
        with BuildLine():
            ThreePointArc((0, -13.00001), (-0.5857899732, -14.4142170979), (-2, -15))
            Line((-2, -15), (0, -15))
            Line((0, -15), (0, -13.00001))
        make_face()
    revolve(axis=Axis((25.50001, 0, -13.00001), (0, -1, 0)), revolution_arc=F3_T46_ANGLE, mode=Mode.SUBTRACT)

    # F3_s47 → F3_t48 (revolve, cut)
    with BuildSketch(Plane.XY.offset(-8.3553250879)):
        with BuildLine():
            ThreePointArc((25.5, 0), (26.9142135624, -0.5857864376), (27.5, -2))
            Line((27.5, -2), (27.5, 0))
            Line((27.5, 0), (25.5, 0))
        make_face()
    revolve(axis=Axis((31.75, 0, -8.3553250879), (0, 1, 0)), revolution_arc=F3_T48_ANGLE, mode=Mode.SUBTRACT)

    # F3_s49 → F3_t50 (revolve, cut)
    with BuildSketch(Plane.XY.offset(-13.00001)):
        with BuildLine():
            ThreePointArc((37.99999, 0), (36.5857829021, -0.5857899732), (36, -2))
            Line((36, -2), (36, 0))
            Line((36, 0), (37.99999, 0))
        make_face()
    revolve(axis=Axis((37.99999, 0, -13.00001), (0, -1, 0)), revolution_arc=F3_T50_ANGLE, mode=Mode.SUBTRACT)

    # F3_s51 → F3_t52 (revolve, cut)
    with BuildSketch(Plane.YZ.offset(38.00001)):
        with BuildLine():
            ThreePointArc((0, -13.00001), (-0.5857899732, -14.4142170979), (-2, -15))
            Line((-2, -15), (0, -15))
            Line((0, -15), (0, -13.00001))
        make_face()
    revolve(axis=Axis((38.00001, 0, -13.00001), (0, -1, 0)), revolution_arc=F3_T52_ANGLE, mode=Mode.SUBTRACT)


solid = f1.part
